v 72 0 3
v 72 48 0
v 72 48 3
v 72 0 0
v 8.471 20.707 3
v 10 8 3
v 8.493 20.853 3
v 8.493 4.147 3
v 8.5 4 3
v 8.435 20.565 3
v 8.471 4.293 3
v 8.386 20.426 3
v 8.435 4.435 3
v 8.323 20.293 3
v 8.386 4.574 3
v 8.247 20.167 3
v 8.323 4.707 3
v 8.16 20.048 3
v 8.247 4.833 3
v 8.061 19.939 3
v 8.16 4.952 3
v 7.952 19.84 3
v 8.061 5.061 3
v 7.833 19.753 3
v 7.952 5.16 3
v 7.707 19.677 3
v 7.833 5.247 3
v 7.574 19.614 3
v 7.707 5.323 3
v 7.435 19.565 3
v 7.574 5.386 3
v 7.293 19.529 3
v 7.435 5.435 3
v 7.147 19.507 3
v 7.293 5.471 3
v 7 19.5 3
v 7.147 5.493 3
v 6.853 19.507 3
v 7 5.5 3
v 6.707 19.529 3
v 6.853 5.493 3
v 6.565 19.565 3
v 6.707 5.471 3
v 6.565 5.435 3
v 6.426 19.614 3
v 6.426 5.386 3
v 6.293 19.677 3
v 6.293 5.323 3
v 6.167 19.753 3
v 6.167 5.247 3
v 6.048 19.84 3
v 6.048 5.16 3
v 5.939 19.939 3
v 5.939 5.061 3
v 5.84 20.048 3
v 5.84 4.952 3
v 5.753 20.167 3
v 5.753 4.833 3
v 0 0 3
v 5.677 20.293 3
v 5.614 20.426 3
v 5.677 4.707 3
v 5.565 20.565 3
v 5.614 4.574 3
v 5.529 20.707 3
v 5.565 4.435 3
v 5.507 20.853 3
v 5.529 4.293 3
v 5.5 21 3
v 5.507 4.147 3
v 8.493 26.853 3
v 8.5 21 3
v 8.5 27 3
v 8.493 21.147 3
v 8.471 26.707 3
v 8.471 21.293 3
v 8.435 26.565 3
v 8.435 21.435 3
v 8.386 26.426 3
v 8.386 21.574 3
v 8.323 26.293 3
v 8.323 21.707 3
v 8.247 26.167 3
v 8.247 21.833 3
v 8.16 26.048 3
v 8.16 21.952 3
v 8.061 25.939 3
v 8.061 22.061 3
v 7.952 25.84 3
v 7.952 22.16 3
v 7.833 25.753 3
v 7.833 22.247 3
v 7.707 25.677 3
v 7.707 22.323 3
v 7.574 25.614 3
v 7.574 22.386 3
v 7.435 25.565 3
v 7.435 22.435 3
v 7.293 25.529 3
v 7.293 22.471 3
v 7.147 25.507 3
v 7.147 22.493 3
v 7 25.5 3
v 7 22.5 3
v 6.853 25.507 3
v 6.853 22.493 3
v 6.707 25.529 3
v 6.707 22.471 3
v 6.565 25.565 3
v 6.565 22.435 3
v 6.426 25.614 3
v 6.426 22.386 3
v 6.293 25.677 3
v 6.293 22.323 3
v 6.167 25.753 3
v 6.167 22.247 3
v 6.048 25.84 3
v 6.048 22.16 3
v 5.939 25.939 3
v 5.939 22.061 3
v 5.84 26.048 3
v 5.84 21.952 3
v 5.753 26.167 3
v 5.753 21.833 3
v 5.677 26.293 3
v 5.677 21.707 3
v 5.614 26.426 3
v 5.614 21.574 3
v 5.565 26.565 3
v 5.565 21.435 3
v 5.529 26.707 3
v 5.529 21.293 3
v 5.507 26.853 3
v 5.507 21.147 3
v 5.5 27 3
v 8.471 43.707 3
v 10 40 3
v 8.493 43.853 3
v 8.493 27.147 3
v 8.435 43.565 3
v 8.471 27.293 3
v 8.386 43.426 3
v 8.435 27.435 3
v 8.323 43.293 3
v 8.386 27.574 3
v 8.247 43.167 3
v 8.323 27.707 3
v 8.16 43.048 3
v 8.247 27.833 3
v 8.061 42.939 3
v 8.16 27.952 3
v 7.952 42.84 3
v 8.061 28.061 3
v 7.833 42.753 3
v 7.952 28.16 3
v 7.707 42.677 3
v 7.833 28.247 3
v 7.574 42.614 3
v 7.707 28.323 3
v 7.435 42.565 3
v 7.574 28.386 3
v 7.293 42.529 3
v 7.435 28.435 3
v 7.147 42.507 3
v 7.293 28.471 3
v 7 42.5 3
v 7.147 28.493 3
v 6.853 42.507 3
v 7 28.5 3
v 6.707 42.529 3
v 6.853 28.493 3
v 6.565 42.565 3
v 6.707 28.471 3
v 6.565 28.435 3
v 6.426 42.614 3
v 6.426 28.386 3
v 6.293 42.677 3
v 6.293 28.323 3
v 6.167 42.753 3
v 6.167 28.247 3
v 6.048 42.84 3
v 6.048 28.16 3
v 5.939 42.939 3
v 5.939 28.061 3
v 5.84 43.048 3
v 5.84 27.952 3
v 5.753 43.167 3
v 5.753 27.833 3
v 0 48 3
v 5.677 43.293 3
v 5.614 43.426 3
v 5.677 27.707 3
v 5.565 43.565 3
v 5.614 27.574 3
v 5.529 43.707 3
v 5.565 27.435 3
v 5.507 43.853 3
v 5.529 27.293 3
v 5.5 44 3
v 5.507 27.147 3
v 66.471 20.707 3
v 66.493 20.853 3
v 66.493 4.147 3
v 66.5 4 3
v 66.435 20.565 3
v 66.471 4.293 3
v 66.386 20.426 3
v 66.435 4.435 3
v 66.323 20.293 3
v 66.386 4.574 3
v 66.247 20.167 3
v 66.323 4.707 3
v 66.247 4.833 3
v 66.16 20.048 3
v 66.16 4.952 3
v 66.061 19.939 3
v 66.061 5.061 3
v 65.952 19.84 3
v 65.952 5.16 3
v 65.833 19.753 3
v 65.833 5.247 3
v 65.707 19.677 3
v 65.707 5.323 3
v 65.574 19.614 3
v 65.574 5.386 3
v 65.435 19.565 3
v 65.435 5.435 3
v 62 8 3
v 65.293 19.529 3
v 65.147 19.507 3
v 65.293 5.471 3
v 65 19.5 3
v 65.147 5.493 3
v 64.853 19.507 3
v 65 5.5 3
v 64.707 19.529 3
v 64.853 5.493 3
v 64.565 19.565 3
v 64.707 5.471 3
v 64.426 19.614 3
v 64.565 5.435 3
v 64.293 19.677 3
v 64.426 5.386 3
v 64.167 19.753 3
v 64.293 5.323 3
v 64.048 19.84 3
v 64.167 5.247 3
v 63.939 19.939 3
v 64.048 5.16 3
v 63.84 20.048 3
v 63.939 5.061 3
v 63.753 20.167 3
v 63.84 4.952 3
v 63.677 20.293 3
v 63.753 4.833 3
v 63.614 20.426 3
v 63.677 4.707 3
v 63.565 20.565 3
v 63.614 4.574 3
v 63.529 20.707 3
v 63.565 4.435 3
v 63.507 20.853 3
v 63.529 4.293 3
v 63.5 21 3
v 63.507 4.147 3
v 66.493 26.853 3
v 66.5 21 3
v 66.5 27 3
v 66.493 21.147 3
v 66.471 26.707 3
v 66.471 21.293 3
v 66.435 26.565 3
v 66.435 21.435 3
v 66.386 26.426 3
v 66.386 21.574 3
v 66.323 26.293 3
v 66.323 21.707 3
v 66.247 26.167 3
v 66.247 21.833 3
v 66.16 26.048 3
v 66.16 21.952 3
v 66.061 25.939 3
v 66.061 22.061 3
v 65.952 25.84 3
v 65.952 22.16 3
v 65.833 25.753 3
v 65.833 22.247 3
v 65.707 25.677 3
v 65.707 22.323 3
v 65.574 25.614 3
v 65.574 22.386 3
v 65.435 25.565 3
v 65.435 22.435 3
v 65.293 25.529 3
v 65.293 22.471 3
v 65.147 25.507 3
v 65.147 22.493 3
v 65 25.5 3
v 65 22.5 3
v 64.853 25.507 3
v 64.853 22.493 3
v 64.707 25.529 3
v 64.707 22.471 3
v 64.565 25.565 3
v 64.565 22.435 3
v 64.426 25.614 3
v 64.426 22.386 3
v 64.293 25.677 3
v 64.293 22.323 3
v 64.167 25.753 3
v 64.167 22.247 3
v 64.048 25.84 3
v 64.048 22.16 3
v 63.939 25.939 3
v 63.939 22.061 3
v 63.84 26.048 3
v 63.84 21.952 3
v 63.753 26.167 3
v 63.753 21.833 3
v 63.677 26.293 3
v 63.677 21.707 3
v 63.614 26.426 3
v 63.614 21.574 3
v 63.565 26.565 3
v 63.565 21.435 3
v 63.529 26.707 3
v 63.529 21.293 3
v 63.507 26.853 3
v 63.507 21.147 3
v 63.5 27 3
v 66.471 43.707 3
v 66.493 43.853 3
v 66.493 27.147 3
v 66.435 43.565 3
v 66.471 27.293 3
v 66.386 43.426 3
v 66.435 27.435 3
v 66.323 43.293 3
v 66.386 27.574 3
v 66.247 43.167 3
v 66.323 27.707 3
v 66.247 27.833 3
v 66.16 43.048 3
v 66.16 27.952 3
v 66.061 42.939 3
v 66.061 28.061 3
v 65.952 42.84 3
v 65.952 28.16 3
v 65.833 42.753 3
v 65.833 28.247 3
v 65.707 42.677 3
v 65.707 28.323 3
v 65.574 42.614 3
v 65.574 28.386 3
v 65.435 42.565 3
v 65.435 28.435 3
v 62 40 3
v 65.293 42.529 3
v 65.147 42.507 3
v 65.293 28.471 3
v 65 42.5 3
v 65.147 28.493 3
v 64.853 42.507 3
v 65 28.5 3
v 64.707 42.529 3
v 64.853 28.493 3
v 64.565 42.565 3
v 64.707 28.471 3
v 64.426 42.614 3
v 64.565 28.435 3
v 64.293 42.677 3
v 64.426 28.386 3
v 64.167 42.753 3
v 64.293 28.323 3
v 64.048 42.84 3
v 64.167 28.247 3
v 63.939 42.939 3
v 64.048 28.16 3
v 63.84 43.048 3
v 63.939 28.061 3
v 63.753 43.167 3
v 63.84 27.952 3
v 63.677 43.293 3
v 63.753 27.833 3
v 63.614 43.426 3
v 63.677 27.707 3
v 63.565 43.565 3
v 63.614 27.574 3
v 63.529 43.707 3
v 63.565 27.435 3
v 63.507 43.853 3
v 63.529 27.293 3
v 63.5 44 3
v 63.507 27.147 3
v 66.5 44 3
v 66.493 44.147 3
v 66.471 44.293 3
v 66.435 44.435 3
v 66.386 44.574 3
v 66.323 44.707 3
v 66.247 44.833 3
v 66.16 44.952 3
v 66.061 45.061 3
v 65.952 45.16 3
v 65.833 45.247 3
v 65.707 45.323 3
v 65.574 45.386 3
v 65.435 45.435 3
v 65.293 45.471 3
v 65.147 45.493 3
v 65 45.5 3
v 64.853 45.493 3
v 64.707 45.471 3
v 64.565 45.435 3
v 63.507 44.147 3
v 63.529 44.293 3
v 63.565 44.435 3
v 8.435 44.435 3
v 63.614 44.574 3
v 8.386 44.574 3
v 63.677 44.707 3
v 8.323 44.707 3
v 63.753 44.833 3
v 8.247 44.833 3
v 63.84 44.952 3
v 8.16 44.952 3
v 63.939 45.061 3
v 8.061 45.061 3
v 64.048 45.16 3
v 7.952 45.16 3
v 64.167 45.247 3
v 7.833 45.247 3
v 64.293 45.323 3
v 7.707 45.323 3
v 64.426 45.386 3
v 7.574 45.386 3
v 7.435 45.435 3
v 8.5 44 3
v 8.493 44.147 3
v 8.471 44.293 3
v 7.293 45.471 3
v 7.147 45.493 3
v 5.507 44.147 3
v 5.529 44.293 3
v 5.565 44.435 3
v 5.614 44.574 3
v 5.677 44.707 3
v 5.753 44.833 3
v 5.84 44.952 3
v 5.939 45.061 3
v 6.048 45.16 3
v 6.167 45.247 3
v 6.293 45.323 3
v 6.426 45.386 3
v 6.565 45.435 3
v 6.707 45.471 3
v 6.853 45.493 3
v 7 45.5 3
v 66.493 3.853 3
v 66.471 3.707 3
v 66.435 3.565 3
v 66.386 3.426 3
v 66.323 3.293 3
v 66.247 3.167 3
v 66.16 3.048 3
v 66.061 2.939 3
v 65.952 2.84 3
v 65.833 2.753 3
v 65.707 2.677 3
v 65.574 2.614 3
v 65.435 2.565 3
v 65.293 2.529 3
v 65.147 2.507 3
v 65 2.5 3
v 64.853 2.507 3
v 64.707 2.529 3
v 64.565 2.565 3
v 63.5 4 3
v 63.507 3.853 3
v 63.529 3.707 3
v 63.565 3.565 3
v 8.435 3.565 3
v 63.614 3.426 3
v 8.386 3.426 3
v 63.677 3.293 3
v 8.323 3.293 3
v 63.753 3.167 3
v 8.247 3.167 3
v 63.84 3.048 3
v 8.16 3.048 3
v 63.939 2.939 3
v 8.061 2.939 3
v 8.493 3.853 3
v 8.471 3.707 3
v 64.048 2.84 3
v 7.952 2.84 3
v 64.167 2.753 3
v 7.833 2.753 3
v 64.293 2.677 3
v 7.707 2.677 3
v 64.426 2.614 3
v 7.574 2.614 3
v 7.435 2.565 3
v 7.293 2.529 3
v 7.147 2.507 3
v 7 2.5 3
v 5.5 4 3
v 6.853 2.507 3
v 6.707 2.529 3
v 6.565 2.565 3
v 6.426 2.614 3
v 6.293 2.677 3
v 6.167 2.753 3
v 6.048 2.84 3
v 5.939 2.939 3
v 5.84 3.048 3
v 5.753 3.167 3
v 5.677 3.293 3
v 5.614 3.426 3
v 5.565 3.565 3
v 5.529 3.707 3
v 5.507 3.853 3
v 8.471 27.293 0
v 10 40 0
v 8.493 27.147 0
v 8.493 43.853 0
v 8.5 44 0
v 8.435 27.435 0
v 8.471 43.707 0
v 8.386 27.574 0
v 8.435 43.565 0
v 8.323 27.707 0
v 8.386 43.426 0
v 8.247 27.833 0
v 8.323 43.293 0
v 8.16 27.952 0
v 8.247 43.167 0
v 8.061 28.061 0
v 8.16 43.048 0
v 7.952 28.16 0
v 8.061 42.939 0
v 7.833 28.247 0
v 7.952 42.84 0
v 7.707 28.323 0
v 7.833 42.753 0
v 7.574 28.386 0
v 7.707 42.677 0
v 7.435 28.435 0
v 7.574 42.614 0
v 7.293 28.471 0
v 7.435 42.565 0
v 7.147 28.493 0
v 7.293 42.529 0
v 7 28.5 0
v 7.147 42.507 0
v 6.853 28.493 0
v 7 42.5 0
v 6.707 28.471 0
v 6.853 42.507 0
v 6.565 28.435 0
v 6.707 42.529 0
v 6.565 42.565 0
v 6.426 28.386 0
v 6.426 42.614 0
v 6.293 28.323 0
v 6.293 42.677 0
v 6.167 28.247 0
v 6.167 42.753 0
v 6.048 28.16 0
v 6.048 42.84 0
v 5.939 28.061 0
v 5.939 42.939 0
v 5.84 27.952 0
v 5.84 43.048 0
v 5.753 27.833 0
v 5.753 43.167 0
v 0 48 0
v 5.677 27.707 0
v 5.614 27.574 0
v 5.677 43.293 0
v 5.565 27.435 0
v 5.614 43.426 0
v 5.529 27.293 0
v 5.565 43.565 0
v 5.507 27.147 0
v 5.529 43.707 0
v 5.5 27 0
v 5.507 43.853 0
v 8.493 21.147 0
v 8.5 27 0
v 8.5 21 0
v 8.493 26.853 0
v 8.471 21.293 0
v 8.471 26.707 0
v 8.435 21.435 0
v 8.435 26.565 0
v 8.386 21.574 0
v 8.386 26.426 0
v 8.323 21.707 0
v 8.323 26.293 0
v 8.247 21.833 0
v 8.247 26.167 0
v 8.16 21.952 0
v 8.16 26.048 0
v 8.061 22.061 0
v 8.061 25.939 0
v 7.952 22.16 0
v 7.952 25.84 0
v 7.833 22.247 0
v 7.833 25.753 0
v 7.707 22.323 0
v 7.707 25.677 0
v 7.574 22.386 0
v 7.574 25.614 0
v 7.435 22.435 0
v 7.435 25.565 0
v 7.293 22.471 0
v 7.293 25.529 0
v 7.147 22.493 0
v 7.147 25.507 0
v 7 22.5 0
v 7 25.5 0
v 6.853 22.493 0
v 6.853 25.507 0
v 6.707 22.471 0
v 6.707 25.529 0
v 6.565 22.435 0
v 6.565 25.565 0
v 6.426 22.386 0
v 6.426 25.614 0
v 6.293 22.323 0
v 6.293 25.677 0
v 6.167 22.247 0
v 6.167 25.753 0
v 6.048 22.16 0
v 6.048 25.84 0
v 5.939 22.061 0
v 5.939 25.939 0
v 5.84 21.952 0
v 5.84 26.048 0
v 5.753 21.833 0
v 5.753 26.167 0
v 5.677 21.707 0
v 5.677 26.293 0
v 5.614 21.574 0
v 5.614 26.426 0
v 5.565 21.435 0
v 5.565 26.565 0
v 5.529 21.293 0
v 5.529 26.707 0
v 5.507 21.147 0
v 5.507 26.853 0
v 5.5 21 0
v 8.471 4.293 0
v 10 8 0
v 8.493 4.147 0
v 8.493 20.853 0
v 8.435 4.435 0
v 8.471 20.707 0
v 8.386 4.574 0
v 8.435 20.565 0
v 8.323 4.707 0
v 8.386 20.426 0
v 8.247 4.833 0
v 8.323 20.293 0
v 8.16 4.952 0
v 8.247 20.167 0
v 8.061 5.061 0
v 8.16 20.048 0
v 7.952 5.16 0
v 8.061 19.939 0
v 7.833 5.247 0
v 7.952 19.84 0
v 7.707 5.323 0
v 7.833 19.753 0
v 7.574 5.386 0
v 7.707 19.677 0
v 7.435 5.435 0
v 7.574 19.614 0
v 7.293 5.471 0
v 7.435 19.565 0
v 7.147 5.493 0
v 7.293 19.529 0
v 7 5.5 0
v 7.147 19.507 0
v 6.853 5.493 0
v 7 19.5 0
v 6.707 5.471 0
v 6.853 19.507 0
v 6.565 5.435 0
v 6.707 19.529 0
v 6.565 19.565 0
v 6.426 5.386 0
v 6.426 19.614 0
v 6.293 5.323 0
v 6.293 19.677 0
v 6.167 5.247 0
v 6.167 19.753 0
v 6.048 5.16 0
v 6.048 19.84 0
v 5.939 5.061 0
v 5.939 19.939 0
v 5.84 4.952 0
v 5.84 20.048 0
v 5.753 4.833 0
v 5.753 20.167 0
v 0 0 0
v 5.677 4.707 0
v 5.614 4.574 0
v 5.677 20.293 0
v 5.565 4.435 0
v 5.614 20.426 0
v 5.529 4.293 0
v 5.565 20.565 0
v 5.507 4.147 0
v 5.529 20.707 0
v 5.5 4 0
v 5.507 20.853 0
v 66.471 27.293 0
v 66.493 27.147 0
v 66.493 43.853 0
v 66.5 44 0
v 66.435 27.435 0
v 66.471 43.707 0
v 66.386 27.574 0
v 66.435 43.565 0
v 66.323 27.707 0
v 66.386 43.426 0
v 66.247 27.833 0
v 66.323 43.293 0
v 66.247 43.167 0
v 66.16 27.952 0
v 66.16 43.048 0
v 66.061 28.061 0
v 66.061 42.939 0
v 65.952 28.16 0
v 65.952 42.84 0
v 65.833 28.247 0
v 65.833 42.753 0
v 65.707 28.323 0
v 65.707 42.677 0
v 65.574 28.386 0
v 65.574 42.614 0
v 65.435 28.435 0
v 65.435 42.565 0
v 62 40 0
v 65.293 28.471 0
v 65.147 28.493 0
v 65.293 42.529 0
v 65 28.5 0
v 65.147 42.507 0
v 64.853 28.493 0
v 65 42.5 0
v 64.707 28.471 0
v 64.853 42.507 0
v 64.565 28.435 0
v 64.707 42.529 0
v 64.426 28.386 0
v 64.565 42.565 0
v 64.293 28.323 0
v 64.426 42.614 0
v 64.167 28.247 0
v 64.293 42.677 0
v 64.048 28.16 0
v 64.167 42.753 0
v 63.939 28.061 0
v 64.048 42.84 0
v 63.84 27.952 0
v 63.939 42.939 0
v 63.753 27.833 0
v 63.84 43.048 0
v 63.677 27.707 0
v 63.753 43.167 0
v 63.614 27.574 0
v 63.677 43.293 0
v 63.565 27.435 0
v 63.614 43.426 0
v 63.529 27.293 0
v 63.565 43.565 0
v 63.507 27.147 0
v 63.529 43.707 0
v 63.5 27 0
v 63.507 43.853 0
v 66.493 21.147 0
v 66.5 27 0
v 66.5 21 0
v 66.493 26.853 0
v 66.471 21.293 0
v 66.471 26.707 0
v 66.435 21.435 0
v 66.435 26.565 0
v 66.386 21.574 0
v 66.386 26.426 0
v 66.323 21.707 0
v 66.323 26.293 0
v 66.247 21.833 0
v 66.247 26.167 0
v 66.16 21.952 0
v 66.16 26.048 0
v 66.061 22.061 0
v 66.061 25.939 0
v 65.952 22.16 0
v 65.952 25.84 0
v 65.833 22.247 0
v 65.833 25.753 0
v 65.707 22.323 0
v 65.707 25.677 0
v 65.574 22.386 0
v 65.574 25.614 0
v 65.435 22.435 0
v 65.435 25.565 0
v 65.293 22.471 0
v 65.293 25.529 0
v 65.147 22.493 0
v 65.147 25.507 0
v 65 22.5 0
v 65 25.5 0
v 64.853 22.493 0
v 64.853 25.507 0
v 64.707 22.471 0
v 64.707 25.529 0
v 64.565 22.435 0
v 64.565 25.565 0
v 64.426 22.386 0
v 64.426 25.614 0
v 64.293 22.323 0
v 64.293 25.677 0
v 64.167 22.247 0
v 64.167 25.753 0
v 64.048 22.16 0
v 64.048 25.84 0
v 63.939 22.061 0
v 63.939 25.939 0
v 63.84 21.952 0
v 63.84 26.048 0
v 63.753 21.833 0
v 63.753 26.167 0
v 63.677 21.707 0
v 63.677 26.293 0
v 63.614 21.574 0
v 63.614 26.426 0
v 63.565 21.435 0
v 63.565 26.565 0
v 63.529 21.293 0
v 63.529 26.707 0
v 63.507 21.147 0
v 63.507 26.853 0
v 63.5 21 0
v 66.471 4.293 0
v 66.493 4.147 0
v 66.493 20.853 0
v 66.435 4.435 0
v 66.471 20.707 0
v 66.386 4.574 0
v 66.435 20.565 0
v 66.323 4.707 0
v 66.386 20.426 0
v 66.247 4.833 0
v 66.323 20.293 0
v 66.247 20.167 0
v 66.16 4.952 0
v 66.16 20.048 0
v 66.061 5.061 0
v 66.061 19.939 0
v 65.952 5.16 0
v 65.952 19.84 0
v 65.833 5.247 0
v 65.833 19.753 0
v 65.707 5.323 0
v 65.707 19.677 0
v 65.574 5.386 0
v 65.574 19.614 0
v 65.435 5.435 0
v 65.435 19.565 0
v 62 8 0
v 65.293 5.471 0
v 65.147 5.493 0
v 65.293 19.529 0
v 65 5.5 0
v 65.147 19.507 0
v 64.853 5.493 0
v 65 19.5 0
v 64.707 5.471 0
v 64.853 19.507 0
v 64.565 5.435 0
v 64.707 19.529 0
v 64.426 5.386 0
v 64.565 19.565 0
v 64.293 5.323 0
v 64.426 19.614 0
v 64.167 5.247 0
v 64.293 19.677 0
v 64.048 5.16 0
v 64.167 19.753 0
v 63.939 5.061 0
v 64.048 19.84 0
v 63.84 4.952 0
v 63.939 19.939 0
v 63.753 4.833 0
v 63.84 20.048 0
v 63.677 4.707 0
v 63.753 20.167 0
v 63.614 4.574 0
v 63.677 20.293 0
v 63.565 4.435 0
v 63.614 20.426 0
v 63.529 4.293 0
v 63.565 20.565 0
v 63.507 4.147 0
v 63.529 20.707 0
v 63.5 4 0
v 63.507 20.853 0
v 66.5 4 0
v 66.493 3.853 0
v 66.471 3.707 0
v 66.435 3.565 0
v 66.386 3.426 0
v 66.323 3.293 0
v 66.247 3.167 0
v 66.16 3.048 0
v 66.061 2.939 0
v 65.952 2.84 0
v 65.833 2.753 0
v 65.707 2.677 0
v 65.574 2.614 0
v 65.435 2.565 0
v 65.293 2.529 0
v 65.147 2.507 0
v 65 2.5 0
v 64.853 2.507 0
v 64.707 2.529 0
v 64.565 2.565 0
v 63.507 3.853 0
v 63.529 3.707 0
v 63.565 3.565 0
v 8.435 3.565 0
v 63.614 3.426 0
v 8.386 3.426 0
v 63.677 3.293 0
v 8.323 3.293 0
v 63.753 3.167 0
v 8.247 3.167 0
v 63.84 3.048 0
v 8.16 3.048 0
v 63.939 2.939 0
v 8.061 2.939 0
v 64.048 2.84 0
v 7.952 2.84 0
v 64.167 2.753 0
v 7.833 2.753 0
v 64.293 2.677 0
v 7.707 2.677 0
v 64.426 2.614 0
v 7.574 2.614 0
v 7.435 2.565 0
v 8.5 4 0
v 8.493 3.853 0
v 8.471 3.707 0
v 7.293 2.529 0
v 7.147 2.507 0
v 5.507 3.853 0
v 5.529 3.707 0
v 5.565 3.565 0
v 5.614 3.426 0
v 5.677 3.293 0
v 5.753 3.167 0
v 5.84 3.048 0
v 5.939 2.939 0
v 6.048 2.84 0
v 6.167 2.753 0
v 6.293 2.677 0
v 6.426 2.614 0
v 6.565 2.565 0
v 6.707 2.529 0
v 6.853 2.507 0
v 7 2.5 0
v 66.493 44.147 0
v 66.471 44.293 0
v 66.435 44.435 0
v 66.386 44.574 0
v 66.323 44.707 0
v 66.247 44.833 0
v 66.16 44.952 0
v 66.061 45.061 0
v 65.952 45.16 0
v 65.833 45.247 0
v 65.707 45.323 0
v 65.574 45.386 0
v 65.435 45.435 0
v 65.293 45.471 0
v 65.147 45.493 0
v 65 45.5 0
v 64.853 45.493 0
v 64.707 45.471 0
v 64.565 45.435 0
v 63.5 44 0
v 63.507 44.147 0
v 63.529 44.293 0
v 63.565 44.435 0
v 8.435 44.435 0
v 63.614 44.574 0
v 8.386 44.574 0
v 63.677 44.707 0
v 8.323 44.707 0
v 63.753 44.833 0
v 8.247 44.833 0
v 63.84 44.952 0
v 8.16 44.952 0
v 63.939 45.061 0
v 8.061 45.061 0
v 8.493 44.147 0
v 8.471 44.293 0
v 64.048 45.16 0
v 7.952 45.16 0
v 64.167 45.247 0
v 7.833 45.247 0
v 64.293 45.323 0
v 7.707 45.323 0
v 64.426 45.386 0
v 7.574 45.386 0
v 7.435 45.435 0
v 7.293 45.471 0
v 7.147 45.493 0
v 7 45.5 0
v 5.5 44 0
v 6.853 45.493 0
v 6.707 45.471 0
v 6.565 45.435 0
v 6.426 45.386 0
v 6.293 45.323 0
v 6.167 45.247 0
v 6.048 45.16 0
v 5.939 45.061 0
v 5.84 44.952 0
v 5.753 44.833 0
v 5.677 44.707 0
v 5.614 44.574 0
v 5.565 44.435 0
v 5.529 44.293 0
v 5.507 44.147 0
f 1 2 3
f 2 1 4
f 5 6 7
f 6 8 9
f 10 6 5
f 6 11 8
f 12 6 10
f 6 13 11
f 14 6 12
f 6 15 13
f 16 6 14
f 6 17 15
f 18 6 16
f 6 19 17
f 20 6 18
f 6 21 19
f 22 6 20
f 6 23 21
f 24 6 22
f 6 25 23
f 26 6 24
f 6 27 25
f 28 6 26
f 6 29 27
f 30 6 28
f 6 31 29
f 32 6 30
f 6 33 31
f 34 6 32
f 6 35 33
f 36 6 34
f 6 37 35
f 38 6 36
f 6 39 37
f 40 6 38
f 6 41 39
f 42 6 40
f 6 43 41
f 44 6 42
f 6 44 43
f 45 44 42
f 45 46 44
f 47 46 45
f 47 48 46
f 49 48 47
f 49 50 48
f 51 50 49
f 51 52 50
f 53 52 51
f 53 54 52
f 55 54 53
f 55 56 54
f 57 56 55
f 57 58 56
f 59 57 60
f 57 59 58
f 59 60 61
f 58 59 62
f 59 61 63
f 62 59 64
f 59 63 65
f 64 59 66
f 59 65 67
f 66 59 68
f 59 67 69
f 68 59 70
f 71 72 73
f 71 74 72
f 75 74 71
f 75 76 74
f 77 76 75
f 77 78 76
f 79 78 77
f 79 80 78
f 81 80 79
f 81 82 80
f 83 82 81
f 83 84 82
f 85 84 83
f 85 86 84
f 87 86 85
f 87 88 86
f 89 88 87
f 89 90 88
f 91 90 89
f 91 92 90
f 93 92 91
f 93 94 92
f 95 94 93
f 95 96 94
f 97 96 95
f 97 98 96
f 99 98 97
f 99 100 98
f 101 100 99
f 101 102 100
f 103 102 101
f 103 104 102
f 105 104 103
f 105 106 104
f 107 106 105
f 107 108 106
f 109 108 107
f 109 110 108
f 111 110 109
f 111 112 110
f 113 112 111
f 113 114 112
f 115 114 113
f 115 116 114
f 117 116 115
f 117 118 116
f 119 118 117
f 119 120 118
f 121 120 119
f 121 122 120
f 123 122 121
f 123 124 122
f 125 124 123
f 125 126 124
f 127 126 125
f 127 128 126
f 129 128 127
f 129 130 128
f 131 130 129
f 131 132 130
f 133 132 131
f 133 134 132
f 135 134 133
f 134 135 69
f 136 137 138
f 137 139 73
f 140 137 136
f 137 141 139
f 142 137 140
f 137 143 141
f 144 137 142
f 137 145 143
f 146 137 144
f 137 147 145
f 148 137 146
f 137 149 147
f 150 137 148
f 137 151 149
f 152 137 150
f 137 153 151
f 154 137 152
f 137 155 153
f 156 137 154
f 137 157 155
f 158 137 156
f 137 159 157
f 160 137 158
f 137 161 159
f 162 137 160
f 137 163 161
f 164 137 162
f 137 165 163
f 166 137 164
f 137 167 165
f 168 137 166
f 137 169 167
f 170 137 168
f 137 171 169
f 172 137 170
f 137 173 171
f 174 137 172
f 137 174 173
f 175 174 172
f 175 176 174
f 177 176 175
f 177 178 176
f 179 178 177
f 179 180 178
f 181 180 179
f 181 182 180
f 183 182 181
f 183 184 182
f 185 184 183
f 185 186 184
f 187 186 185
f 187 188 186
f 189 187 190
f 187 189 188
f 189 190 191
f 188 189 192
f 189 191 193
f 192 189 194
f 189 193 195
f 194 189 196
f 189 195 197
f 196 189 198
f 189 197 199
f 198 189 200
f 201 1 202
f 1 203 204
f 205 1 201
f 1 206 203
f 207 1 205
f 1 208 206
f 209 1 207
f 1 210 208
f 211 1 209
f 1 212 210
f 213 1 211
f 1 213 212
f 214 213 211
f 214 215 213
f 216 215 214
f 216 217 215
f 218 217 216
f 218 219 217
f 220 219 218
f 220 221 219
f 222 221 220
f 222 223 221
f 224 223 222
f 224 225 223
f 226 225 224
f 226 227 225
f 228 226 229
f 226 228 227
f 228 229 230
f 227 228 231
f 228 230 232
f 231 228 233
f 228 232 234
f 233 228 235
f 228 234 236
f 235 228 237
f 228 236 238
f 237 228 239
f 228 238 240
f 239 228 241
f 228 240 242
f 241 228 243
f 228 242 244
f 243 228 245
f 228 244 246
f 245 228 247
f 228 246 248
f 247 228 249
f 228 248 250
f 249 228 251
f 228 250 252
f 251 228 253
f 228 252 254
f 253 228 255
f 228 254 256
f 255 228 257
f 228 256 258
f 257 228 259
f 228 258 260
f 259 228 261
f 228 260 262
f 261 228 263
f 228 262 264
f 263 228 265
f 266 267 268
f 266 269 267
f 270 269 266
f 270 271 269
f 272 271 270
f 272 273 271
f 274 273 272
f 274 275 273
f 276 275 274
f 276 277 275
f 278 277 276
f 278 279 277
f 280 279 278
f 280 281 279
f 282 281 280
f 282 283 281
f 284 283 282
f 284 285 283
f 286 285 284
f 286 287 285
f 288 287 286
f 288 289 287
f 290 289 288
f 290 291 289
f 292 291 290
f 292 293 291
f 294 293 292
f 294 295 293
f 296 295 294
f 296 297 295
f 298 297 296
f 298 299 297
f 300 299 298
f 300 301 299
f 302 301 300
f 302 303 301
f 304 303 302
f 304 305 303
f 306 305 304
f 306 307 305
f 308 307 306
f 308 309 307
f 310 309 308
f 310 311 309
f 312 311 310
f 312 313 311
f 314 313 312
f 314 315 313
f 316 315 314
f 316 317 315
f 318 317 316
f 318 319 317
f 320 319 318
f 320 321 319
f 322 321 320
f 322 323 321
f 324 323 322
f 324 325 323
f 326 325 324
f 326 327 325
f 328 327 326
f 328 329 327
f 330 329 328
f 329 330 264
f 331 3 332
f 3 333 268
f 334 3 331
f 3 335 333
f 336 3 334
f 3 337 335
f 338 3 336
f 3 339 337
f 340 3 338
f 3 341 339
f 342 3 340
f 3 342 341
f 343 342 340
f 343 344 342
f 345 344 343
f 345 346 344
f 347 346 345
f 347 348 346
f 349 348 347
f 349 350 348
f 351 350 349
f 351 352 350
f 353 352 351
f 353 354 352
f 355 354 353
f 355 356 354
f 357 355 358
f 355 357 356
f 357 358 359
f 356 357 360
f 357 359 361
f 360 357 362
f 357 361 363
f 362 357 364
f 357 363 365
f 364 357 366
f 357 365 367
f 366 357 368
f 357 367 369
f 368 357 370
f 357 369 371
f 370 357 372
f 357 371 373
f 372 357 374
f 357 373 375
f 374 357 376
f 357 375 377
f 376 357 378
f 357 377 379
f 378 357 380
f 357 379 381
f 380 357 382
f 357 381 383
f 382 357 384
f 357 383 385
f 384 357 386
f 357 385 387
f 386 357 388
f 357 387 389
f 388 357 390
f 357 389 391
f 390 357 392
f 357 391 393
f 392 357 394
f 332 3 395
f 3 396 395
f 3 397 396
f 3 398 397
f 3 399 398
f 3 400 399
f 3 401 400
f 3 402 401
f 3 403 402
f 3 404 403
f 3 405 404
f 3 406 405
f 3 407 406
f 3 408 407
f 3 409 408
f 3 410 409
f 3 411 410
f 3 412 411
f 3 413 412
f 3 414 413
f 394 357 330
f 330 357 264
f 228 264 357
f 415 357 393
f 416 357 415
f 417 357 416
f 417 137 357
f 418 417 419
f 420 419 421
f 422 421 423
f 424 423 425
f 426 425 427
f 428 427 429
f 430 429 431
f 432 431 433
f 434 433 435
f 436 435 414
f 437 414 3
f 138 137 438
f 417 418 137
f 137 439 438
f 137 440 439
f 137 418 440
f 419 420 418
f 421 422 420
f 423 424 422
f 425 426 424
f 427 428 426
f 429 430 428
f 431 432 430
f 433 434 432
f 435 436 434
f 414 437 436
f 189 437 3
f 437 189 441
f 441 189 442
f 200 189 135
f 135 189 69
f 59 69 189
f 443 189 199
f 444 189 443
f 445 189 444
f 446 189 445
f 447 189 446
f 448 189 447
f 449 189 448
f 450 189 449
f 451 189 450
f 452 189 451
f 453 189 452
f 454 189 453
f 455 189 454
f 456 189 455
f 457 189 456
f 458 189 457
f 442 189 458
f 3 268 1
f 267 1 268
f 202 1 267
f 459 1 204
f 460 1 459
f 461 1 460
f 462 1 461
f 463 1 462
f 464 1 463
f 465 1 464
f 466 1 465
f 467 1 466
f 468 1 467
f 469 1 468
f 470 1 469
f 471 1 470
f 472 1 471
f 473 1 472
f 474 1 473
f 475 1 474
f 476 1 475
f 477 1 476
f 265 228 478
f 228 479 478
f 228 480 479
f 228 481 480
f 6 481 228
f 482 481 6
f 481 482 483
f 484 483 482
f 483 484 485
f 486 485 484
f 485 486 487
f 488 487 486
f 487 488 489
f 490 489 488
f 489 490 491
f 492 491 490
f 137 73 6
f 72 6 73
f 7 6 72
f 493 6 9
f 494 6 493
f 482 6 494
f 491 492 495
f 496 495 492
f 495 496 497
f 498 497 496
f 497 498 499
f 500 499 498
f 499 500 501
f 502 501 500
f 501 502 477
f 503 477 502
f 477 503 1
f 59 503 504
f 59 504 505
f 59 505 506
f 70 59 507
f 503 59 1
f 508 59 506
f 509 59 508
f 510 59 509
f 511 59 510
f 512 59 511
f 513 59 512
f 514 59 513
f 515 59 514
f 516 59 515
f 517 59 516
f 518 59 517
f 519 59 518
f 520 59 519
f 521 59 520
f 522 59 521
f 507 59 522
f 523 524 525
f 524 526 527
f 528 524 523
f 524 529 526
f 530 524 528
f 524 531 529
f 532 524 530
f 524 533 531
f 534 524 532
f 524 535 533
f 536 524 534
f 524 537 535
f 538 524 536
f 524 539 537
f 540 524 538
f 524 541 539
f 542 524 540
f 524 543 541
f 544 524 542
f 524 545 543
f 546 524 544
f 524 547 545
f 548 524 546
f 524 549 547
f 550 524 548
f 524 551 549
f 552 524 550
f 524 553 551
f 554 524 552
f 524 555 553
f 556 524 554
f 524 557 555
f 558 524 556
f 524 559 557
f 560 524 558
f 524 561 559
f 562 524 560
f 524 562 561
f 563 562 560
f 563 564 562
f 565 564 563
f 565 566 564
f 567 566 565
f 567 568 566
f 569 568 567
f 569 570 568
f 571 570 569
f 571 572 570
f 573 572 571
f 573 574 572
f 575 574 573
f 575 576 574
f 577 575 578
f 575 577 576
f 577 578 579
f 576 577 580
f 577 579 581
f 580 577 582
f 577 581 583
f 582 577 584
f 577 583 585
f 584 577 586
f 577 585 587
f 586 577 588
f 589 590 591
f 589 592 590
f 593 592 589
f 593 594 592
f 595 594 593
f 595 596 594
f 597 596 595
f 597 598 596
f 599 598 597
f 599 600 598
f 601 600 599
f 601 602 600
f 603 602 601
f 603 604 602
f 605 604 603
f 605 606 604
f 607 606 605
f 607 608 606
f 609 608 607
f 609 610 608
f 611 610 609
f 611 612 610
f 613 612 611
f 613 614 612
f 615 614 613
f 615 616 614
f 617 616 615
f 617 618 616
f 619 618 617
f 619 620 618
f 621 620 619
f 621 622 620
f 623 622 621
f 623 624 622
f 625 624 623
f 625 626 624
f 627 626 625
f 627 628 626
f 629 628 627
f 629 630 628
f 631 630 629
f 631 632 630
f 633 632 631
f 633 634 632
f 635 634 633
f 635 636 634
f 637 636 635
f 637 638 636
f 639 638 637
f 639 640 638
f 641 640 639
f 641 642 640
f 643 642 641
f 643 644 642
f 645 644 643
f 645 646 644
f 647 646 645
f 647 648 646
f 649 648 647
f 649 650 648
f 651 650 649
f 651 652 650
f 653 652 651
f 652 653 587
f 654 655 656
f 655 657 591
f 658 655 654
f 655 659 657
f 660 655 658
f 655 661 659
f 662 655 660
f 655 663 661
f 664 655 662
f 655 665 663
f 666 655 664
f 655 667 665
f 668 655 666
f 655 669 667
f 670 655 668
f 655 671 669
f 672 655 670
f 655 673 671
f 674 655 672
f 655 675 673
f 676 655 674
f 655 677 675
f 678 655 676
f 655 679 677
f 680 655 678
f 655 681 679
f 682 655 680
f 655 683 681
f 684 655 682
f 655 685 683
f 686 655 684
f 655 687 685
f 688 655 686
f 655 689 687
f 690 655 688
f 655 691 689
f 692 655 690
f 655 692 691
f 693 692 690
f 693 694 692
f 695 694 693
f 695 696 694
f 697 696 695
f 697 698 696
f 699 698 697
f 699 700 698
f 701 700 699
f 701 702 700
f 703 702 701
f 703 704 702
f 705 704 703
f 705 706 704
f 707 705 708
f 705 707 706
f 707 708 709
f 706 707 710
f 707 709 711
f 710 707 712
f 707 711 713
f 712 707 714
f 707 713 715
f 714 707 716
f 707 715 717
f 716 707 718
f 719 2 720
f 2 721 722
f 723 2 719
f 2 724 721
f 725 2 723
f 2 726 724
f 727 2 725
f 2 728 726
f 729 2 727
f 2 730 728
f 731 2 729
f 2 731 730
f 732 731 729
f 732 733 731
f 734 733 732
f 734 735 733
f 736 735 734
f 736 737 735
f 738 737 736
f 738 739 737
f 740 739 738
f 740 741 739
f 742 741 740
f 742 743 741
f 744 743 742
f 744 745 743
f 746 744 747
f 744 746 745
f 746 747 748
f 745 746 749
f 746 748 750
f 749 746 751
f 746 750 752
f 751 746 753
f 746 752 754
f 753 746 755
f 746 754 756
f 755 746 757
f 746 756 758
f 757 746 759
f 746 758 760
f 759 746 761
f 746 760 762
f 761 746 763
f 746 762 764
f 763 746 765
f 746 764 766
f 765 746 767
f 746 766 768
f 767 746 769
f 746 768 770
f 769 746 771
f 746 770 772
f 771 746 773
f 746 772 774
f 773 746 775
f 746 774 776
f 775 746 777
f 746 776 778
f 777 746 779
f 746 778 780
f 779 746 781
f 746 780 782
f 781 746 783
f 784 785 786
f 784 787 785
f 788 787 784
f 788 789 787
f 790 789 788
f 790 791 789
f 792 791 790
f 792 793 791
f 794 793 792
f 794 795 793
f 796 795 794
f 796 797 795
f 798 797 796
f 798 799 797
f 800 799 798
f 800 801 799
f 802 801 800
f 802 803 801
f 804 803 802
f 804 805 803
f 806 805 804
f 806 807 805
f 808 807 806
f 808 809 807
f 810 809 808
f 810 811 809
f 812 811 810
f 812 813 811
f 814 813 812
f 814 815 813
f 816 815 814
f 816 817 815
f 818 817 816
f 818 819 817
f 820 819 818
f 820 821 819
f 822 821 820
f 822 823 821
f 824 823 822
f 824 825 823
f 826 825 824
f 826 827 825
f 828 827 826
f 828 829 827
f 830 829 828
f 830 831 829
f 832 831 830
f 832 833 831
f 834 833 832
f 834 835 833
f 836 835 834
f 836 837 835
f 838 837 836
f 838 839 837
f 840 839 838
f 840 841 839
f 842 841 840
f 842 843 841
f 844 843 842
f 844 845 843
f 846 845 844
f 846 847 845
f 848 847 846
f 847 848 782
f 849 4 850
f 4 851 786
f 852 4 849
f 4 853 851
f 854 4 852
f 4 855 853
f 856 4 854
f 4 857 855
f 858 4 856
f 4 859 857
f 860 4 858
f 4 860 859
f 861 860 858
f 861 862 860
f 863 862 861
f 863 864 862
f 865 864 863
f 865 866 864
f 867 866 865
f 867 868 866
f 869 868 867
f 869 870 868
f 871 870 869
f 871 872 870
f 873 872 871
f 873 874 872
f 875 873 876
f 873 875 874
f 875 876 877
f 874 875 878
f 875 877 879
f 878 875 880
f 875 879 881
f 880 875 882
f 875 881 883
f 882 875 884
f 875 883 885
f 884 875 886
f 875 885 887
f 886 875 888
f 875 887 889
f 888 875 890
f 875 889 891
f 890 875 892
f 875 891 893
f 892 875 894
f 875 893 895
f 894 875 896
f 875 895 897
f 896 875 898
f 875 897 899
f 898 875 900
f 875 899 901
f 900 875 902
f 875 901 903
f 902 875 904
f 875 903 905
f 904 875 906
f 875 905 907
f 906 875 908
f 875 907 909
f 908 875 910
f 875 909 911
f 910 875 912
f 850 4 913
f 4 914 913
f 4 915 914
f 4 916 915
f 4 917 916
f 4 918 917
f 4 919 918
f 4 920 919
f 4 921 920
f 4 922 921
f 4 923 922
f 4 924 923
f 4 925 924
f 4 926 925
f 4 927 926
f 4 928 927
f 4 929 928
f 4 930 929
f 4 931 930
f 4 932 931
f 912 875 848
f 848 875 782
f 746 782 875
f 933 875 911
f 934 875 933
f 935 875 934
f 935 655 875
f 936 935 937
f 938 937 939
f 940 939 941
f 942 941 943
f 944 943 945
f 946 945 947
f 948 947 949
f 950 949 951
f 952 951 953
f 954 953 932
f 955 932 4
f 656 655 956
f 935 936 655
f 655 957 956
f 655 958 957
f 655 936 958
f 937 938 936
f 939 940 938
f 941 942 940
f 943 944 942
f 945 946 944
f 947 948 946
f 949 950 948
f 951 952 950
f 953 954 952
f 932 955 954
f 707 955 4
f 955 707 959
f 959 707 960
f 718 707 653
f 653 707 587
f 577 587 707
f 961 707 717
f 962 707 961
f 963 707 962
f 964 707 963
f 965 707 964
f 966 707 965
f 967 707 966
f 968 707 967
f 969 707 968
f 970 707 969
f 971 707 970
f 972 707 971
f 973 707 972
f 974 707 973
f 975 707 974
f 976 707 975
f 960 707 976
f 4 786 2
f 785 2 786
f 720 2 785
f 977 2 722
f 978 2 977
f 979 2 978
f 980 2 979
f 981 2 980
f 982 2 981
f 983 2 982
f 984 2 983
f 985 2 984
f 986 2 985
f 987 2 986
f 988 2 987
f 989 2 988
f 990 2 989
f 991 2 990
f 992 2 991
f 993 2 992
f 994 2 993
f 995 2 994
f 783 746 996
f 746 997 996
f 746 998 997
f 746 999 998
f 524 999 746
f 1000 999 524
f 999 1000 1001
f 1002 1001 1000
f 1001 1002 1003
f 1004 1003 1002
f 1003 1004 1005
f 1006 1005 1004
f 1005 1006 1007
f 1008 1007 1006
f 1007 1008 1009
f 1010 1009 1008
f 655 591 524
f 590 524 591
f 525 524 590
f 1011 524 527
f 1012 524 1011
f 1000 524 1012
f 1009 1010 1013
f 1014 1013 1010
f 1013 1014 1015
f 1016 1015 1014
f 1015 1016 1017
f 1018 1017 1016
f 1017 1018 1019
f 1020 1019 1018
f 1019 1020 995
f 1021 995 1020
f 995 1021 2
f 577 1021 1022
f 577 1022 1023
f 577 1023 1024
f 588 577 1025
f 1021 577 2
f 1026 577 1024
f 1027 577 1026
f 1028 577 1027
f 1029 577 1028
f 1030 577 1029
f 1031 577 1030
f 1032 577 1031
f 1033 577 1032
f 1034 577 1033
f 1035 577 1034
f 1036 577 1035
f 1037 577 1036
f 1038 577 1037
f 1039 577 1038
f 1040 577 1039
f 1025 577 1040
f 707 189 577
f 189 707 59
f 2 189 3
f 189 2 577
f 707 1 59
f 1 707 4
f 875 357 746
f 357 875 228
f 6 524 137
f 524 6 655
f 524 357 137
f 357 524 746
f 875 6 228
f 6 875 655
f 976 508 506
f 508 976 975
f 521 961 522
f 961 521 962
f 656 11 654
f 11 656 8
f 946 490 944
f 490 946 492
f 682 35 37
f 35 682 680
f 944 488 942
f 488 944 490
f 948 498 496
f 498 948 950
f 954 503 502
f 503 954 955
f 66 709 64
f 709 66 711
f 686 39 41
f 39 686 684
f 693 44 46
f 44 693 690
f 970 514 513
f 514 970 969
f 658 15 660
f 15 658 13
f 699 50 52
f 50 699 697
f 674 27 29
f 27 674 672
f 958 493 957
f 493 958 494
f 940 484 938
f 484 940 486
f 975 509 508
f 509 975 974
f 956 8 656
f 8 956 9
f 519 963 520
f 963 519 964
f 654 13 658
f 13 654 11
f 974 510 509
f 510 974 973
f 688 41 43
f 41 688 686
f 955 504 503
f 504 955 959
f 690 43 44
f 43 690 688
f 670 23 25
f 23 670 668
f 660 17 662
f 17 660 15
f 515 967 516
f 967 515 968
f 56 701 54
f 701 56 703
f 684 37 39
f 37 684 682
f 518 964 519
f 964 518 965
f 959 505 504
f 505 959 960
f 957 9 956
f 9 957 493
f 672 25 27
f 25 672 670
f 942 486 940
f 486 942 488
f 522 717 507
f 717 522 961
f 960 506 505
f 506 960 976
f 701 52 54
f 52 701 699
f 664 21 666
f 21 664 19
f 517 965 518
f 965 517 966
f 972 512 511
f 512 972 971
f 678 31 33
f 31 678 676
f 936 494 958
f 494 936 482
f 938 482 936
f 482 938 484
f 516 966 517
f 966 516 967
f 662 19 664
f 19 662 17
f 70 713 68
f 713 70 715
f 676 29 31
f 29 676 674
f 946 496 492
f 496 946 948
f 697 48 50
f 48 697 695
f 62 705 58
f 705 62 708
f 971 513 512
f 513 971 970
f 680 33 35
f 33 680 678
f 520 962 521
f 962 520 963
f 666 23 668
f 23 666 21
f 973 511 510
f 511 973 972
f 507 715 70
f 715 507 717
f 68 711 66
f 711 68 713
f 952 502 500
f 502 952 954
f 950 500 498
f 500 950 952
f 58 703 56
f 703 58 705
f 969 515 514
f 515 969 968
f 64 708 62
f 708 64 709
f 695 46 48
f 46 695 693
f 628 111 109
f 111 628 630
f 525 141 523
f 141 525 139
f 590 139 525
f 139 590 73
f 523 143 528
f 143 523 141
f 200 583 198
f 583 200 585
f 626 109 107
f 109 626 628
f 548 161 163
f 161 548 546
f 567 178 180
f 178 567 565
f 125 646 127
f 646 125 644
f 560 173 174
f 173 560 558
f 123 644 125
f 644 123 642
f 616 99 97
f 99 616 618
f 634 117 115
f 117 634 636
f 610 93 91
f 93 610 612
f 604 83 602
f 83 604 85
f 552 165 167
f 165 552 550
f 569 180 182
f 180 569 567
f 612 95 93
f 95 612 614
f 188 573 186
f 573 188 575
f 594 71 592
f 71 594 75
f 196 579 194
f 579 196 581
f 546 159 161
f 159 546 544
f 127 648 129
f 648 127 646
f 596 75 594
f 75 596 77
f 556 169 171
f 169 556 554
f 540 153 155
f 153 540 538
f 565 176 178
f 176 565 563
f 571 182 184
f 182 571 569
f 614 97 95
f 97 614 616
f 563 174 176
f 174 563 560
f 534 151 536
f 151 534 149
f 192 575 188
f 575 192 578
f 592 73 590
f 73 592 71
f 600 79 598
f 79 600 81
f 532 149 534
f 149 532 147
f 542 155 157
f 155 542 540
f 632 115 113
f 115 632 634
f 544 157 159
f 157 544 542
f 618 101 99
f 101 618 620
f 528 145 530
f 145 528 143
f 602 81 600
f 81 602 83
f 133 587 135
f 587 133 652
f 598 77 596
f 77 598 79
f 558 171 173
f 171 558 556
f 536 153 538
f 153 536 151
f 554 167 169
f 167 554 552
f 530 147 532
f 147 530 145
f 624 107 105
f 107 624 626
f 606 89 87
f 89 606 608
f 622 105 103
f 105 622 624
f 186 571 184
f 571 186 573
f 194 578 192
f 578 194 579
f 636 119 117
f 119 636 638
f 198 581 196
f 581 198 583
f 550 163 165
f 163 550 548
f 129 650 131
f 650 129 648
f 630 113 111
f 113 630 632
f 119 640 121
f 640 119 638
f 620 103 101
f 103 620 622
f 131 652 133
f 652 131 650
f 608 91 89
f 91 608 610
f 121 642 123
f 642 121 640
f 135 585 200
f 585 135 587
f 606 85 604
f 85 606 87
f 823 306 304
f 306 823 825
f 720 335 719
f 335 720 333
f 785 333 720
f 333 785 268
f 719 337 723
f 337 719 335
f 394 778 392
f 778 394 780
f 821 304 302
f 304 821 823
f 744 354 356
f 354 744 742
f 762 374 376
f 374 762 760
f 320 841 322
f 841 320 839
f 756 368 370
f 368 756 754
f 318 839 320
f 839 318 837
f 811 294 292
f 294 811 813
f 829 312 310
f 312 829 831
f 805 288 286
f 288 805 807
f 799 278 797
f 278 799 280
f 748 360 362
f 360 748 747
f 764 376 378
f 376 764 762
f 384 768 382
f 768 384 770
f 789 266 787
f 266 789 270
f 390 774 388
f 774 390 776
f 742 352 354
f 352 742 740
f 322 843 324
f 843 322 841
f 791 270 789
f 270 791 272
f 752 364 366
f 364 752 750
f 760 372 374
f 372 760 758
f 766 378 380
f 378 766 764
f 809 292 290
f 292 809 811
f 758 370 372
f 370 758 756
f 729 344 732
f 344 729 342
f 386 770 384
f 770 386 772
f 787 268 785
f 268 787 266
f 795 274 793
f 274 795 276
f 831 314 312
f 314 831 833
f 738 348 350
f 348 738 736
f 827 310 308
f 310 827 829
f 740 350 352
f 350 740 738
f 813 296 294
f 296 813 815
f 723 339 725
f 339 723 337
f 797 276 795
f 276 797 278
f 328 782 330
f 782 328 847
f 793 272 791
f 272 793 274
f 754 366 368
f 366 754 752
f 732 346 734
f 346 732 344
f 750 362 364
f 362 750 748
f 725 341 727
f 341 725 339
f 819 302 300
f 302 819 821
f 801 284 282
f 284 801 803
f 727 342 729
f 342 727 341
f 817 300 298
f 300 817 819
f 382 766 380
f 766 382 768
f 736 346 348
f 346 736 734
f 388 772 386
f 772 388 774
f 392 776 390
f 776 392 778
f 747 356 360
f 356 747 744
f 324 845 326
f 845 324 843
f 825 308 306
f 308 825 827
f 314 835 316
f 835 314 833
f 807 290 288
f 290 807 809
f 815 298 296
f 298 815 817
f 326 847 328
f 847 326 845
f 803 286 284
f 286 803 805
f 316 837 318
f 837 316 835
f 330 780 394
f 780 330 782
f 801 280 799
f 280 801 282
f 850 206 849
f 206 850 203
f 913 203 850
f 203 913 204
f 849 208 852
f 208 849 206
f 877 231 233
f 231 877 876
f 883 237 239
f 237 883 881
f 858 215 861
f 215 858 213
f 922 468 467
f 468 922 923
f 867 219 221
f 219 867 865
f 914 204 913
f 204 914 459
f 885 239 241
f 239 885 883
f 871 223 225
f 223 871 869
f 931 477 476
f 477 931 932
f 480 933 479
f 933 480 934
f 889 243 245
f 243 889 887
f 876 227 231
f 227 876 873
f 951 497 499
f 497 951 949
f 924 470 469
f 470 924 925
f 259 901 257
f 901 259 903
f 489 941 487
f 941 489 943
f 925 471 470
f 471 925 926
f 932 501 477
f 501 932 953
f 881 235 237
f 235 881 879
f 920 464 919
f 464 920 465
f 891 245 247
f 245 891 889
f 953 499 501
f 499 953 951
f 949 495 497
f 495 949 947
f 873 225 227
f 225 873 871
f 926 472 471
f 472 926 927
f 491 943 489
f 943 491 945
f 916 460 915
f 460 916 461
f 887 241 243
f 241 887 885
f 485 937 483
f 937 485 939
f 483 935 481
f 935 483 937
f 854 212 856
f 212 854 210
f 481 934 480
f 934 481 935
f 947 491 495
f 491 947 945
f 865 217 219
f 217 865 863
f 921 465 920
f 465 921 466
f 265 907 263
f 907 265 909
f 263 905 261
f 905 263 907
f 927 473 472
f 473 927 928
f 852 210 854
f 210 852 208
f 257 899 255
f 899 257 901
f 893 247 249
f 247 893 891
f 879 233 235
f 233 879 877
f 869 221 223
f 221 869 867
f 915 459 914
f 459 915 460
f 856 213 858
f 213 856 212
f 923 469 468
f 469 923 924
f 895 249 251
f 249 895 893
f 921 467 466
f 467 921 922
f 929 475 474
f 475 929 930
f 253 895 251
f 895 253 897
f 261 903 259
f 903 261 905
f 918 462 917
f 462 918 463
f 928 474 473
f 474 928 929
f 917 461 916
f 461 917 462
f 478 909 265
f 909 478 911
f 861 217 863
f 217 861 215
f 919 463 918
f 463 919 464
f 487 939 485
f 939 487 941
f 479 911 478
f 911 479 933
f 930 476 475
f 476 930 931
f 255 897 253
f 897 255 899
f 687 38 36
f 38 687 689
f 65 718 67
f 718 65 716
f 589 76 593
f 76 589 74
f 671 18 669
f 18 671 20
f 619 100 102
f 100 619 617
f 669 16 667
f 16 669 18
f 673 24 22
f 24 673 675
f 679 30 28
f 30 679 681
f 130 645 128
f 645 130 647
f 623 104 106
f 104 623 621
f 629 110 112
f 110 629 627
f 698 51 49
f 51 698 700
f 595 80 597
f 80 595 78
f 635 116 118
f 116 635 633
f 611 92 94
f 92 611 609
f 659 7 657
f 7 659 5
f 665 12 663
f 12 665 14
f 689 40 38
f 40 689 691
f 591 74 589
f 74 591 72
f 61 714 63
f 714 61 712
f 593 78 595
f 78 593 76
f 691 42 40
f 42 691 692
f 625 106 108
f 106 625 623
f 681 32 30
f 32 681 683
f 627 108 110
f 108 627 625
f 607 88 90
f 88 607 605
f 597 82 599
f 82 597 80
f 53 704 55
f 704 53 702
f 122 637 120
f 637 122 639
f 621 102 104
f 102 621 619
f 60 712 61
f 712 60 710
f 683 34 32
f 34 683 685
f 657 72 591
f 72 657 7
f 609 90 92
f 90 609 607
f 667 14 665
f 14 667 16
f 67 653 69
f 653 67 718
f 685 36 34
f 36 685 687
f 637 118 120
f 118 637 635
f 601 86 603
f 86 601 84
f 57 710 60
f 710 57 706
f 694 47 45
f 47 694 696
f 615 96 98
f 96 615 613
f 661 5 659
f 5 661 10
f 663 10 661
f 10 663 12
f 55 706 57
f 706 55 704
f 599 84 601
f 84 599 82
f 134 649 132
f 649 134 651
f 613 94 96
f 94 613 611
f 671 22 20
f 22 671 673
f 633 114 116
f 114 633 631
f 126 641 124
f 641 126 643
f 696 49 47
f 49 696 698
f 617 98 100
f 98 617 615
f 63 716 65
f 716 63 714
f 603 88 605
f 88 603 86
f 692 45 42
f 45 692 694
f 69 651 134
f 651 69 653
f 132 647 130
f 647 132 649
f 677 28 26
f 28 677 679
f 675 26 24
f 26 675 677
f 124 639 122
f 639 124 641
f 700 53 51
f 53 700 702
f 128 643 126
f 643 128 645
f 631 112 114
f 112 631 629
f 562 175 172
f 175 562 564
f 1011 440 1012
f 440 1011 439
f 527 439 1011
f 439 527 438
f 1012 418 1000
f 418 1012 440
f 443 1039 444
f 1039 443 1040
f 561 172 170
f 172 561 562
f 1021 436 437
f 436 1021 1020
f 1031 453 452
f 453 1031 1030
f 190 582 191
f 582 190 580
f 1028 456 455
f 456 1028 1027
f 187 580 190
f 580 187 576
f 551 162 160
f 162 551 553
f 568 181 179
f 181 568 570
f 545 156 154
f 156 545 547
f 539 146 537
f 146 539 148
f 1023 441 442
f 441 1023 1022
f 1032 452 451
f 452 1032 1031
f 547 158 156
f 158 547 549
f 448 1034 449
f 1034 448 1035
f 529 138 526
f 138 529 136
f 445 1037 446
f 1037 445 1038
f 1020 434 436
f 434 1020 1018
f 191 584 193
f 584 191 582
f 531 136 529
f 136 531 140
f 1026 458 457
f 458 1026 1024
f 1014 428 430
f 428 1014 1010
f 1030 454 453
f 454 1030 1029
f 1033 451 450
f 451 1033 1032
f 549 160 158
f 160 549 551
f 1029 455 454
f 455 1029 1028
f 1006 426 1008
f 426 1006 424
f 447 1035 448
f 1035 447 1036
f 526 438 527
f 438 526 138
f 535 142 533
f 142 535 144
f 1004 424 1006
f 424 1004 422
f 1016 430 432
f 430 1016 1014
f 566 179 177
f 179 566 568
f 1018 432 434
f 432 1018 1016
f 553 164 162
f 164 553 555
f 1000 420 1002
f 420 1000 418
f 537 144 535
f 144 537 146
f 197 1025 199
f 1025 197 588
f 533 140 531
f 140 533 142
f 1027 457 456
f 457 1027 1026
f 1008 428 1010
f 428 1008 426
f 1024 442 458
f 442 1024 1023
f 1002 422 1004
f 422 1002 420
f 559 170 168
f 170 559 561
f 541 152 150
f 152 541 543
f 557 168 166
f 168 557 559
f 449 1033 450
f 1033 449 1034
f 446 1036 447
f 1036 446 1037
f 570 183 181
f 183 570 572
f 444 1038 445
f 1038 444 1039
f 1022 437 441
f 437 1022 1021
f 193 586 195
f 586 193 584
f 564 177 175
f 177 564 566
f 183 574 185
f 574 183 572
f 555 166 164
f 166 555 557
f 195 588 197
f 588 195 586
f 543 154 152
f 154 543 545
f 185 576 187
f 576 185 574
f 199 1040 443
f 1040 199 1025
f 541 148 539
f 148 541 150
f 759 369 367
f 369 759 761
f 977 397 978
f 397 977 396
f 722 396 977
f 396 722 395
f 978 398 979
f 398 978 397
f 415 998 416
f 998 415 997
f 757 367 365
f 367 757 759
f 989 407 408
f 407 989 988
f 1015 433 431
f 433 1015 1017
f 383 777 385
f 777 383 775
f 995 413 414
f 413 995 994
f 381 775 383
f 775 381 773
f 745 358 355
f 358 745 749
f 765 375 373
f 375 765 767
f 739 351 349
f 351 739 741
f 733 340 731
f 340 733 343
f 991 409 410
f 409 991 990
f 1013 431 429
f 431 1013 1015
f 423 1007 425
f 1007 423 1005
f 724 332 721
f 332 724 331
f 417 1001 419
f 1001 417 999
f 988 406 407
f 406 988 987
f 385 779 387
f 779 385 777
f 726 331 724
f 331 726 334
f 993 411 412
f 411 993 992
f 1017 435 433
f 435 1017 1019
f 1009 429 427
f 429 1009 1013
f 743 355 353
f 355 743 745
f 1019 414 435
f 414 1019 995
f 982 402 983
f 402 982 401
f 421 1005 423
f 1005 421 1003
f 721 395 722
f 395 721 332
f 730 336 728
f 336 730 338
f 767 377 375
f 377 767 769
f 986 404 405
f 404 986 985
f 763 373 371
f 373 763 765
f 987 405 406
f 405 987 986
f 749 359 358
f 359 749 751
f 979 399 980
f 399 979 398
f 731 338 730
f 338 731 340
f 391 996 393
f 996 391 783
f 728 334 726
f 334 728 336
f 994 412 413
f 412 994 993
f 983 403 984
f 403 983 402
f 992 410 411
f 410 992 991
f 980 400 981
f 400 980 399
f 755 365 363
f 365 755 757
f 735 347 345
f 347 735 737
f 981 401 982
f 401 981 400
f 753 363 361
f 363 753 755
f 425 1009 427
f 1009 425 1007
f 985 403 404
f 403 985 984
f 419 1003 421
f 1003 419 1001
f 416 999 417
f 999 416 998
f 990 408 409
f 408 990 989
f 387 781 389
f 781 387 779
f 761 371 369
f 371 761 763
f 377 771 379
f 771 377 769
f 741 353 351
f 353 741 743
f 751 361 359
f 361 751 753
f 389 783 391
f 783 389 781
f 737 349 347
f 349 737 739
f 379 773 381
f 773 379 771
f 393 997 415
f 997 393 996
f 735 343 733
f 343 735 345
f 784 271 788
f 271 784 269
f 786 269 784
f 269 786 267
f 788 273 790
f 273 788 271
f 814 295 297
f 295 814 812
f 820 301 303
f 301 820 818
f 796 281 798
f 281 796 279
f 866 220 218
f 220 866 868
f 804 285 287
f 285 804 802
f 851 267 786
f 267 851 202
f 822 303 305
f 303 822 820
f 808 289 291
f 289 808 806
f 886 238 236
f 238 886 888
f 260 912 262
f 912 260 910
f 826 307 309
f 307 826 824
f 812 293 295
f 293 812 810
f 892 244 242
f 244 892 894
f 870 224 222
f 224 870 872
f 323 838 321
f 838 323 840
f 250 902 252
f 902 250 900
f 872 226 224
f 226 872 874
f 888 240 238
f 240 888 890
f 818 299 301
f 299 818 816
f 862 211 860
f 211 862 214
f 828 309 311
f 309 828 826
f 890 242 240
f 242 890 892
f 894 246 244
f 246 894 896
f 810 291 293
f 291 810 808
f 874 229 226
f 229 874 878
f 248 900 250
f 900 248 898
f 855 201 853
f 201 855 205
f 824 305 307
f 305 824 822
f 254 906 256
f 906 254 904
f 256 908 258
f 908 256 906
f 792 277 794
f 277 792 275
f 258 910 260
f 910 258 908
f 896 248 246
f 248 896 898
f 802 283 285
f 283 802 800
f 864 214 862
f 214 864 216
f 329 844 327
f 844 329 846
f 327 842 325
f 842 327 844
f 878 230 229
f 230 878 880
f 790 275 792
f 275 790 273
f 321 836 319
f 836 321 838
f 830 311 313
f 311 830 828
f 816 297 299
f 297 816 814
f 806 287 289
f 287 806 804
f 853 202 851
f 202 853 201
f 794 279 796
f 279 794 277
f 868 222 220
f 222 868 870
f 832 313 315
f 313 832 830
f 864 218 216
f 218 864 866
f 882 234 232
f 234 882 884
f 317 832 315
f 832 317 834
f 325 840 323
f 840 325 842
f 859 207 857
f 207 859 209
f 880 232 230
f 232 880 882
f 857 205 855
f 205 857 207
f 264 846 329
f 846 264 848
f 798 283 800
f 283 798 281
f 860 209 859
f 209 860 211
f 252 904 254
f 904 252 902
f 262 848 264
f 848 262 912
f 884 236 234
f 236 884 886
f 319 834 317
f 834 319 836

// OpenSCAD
// For a Pi Zero stack mount to wall.
// Gregory A Sanders - Mar, 2026
//
//

// ea = ears
eax = 10;
eay = 10;
eaz = 6;

// bs = base
bsx = 72;
bsy = 48;
bsz = 3;

// mh = Pi mount hole spacing
mhx = 58;
mhy = 23;

// op = opening in base
opx = 52;
opy = 32;
opz = 10;

$fn=64;
module hole1(){
    cylinder(h=20,r=2);
}

module base(){
    difference(){
        cube([bsx,bsy,bsz]);
        translate([bsx/2,bsy/2,-1])
        cube([opx,opy,opz],true);
    }
}

module wallMountEar(){
    difference(){
    cube([eax,eay,eaz]);
    translate([eax/2,eay/2,-1])
    #hole1();
    }
}

module wallMountEars(){
    translate([0,-eay,-3])
    wallMountEar();
    translate([bsx-eax,-eay,-3])
    wallMountEar();
    translate([bsx-eax,bsy,-3])
    wallMountEar();
    translate([0,bsy,-3])
    wallMountEar();

}

module zeroscrew(){
    union(){
        cylinder(20,r=1.5);
    }
}

module zero(){
    zeroscrew();
    translate([0,mhy,0])
    zeroscrew();
    translate([mhx,mhy,0])
    zeroscrew();
    translate([mhx,0,0])
    zeroscrew();
}

module final(){
    difference(){
        union(){
            base();
            wallMountEars();
        }
        union(){
            translate([bsx/2-mhx/2,4,-.5])
            zero();
            translate([bsx/2-mhx/2,(bsy-mhy)-4,-.5])
            zero();
        }
    }
}

module flat_no_ears(){
    difference(){
        base();
        translate([bsx/2-mhx/2,4,-.5])
        zero();
        translate([bsx/2-mhx/2,(bsy-mhy)-4,-.5])
        zero();
    }
}

// final();
flat_no_ears();
